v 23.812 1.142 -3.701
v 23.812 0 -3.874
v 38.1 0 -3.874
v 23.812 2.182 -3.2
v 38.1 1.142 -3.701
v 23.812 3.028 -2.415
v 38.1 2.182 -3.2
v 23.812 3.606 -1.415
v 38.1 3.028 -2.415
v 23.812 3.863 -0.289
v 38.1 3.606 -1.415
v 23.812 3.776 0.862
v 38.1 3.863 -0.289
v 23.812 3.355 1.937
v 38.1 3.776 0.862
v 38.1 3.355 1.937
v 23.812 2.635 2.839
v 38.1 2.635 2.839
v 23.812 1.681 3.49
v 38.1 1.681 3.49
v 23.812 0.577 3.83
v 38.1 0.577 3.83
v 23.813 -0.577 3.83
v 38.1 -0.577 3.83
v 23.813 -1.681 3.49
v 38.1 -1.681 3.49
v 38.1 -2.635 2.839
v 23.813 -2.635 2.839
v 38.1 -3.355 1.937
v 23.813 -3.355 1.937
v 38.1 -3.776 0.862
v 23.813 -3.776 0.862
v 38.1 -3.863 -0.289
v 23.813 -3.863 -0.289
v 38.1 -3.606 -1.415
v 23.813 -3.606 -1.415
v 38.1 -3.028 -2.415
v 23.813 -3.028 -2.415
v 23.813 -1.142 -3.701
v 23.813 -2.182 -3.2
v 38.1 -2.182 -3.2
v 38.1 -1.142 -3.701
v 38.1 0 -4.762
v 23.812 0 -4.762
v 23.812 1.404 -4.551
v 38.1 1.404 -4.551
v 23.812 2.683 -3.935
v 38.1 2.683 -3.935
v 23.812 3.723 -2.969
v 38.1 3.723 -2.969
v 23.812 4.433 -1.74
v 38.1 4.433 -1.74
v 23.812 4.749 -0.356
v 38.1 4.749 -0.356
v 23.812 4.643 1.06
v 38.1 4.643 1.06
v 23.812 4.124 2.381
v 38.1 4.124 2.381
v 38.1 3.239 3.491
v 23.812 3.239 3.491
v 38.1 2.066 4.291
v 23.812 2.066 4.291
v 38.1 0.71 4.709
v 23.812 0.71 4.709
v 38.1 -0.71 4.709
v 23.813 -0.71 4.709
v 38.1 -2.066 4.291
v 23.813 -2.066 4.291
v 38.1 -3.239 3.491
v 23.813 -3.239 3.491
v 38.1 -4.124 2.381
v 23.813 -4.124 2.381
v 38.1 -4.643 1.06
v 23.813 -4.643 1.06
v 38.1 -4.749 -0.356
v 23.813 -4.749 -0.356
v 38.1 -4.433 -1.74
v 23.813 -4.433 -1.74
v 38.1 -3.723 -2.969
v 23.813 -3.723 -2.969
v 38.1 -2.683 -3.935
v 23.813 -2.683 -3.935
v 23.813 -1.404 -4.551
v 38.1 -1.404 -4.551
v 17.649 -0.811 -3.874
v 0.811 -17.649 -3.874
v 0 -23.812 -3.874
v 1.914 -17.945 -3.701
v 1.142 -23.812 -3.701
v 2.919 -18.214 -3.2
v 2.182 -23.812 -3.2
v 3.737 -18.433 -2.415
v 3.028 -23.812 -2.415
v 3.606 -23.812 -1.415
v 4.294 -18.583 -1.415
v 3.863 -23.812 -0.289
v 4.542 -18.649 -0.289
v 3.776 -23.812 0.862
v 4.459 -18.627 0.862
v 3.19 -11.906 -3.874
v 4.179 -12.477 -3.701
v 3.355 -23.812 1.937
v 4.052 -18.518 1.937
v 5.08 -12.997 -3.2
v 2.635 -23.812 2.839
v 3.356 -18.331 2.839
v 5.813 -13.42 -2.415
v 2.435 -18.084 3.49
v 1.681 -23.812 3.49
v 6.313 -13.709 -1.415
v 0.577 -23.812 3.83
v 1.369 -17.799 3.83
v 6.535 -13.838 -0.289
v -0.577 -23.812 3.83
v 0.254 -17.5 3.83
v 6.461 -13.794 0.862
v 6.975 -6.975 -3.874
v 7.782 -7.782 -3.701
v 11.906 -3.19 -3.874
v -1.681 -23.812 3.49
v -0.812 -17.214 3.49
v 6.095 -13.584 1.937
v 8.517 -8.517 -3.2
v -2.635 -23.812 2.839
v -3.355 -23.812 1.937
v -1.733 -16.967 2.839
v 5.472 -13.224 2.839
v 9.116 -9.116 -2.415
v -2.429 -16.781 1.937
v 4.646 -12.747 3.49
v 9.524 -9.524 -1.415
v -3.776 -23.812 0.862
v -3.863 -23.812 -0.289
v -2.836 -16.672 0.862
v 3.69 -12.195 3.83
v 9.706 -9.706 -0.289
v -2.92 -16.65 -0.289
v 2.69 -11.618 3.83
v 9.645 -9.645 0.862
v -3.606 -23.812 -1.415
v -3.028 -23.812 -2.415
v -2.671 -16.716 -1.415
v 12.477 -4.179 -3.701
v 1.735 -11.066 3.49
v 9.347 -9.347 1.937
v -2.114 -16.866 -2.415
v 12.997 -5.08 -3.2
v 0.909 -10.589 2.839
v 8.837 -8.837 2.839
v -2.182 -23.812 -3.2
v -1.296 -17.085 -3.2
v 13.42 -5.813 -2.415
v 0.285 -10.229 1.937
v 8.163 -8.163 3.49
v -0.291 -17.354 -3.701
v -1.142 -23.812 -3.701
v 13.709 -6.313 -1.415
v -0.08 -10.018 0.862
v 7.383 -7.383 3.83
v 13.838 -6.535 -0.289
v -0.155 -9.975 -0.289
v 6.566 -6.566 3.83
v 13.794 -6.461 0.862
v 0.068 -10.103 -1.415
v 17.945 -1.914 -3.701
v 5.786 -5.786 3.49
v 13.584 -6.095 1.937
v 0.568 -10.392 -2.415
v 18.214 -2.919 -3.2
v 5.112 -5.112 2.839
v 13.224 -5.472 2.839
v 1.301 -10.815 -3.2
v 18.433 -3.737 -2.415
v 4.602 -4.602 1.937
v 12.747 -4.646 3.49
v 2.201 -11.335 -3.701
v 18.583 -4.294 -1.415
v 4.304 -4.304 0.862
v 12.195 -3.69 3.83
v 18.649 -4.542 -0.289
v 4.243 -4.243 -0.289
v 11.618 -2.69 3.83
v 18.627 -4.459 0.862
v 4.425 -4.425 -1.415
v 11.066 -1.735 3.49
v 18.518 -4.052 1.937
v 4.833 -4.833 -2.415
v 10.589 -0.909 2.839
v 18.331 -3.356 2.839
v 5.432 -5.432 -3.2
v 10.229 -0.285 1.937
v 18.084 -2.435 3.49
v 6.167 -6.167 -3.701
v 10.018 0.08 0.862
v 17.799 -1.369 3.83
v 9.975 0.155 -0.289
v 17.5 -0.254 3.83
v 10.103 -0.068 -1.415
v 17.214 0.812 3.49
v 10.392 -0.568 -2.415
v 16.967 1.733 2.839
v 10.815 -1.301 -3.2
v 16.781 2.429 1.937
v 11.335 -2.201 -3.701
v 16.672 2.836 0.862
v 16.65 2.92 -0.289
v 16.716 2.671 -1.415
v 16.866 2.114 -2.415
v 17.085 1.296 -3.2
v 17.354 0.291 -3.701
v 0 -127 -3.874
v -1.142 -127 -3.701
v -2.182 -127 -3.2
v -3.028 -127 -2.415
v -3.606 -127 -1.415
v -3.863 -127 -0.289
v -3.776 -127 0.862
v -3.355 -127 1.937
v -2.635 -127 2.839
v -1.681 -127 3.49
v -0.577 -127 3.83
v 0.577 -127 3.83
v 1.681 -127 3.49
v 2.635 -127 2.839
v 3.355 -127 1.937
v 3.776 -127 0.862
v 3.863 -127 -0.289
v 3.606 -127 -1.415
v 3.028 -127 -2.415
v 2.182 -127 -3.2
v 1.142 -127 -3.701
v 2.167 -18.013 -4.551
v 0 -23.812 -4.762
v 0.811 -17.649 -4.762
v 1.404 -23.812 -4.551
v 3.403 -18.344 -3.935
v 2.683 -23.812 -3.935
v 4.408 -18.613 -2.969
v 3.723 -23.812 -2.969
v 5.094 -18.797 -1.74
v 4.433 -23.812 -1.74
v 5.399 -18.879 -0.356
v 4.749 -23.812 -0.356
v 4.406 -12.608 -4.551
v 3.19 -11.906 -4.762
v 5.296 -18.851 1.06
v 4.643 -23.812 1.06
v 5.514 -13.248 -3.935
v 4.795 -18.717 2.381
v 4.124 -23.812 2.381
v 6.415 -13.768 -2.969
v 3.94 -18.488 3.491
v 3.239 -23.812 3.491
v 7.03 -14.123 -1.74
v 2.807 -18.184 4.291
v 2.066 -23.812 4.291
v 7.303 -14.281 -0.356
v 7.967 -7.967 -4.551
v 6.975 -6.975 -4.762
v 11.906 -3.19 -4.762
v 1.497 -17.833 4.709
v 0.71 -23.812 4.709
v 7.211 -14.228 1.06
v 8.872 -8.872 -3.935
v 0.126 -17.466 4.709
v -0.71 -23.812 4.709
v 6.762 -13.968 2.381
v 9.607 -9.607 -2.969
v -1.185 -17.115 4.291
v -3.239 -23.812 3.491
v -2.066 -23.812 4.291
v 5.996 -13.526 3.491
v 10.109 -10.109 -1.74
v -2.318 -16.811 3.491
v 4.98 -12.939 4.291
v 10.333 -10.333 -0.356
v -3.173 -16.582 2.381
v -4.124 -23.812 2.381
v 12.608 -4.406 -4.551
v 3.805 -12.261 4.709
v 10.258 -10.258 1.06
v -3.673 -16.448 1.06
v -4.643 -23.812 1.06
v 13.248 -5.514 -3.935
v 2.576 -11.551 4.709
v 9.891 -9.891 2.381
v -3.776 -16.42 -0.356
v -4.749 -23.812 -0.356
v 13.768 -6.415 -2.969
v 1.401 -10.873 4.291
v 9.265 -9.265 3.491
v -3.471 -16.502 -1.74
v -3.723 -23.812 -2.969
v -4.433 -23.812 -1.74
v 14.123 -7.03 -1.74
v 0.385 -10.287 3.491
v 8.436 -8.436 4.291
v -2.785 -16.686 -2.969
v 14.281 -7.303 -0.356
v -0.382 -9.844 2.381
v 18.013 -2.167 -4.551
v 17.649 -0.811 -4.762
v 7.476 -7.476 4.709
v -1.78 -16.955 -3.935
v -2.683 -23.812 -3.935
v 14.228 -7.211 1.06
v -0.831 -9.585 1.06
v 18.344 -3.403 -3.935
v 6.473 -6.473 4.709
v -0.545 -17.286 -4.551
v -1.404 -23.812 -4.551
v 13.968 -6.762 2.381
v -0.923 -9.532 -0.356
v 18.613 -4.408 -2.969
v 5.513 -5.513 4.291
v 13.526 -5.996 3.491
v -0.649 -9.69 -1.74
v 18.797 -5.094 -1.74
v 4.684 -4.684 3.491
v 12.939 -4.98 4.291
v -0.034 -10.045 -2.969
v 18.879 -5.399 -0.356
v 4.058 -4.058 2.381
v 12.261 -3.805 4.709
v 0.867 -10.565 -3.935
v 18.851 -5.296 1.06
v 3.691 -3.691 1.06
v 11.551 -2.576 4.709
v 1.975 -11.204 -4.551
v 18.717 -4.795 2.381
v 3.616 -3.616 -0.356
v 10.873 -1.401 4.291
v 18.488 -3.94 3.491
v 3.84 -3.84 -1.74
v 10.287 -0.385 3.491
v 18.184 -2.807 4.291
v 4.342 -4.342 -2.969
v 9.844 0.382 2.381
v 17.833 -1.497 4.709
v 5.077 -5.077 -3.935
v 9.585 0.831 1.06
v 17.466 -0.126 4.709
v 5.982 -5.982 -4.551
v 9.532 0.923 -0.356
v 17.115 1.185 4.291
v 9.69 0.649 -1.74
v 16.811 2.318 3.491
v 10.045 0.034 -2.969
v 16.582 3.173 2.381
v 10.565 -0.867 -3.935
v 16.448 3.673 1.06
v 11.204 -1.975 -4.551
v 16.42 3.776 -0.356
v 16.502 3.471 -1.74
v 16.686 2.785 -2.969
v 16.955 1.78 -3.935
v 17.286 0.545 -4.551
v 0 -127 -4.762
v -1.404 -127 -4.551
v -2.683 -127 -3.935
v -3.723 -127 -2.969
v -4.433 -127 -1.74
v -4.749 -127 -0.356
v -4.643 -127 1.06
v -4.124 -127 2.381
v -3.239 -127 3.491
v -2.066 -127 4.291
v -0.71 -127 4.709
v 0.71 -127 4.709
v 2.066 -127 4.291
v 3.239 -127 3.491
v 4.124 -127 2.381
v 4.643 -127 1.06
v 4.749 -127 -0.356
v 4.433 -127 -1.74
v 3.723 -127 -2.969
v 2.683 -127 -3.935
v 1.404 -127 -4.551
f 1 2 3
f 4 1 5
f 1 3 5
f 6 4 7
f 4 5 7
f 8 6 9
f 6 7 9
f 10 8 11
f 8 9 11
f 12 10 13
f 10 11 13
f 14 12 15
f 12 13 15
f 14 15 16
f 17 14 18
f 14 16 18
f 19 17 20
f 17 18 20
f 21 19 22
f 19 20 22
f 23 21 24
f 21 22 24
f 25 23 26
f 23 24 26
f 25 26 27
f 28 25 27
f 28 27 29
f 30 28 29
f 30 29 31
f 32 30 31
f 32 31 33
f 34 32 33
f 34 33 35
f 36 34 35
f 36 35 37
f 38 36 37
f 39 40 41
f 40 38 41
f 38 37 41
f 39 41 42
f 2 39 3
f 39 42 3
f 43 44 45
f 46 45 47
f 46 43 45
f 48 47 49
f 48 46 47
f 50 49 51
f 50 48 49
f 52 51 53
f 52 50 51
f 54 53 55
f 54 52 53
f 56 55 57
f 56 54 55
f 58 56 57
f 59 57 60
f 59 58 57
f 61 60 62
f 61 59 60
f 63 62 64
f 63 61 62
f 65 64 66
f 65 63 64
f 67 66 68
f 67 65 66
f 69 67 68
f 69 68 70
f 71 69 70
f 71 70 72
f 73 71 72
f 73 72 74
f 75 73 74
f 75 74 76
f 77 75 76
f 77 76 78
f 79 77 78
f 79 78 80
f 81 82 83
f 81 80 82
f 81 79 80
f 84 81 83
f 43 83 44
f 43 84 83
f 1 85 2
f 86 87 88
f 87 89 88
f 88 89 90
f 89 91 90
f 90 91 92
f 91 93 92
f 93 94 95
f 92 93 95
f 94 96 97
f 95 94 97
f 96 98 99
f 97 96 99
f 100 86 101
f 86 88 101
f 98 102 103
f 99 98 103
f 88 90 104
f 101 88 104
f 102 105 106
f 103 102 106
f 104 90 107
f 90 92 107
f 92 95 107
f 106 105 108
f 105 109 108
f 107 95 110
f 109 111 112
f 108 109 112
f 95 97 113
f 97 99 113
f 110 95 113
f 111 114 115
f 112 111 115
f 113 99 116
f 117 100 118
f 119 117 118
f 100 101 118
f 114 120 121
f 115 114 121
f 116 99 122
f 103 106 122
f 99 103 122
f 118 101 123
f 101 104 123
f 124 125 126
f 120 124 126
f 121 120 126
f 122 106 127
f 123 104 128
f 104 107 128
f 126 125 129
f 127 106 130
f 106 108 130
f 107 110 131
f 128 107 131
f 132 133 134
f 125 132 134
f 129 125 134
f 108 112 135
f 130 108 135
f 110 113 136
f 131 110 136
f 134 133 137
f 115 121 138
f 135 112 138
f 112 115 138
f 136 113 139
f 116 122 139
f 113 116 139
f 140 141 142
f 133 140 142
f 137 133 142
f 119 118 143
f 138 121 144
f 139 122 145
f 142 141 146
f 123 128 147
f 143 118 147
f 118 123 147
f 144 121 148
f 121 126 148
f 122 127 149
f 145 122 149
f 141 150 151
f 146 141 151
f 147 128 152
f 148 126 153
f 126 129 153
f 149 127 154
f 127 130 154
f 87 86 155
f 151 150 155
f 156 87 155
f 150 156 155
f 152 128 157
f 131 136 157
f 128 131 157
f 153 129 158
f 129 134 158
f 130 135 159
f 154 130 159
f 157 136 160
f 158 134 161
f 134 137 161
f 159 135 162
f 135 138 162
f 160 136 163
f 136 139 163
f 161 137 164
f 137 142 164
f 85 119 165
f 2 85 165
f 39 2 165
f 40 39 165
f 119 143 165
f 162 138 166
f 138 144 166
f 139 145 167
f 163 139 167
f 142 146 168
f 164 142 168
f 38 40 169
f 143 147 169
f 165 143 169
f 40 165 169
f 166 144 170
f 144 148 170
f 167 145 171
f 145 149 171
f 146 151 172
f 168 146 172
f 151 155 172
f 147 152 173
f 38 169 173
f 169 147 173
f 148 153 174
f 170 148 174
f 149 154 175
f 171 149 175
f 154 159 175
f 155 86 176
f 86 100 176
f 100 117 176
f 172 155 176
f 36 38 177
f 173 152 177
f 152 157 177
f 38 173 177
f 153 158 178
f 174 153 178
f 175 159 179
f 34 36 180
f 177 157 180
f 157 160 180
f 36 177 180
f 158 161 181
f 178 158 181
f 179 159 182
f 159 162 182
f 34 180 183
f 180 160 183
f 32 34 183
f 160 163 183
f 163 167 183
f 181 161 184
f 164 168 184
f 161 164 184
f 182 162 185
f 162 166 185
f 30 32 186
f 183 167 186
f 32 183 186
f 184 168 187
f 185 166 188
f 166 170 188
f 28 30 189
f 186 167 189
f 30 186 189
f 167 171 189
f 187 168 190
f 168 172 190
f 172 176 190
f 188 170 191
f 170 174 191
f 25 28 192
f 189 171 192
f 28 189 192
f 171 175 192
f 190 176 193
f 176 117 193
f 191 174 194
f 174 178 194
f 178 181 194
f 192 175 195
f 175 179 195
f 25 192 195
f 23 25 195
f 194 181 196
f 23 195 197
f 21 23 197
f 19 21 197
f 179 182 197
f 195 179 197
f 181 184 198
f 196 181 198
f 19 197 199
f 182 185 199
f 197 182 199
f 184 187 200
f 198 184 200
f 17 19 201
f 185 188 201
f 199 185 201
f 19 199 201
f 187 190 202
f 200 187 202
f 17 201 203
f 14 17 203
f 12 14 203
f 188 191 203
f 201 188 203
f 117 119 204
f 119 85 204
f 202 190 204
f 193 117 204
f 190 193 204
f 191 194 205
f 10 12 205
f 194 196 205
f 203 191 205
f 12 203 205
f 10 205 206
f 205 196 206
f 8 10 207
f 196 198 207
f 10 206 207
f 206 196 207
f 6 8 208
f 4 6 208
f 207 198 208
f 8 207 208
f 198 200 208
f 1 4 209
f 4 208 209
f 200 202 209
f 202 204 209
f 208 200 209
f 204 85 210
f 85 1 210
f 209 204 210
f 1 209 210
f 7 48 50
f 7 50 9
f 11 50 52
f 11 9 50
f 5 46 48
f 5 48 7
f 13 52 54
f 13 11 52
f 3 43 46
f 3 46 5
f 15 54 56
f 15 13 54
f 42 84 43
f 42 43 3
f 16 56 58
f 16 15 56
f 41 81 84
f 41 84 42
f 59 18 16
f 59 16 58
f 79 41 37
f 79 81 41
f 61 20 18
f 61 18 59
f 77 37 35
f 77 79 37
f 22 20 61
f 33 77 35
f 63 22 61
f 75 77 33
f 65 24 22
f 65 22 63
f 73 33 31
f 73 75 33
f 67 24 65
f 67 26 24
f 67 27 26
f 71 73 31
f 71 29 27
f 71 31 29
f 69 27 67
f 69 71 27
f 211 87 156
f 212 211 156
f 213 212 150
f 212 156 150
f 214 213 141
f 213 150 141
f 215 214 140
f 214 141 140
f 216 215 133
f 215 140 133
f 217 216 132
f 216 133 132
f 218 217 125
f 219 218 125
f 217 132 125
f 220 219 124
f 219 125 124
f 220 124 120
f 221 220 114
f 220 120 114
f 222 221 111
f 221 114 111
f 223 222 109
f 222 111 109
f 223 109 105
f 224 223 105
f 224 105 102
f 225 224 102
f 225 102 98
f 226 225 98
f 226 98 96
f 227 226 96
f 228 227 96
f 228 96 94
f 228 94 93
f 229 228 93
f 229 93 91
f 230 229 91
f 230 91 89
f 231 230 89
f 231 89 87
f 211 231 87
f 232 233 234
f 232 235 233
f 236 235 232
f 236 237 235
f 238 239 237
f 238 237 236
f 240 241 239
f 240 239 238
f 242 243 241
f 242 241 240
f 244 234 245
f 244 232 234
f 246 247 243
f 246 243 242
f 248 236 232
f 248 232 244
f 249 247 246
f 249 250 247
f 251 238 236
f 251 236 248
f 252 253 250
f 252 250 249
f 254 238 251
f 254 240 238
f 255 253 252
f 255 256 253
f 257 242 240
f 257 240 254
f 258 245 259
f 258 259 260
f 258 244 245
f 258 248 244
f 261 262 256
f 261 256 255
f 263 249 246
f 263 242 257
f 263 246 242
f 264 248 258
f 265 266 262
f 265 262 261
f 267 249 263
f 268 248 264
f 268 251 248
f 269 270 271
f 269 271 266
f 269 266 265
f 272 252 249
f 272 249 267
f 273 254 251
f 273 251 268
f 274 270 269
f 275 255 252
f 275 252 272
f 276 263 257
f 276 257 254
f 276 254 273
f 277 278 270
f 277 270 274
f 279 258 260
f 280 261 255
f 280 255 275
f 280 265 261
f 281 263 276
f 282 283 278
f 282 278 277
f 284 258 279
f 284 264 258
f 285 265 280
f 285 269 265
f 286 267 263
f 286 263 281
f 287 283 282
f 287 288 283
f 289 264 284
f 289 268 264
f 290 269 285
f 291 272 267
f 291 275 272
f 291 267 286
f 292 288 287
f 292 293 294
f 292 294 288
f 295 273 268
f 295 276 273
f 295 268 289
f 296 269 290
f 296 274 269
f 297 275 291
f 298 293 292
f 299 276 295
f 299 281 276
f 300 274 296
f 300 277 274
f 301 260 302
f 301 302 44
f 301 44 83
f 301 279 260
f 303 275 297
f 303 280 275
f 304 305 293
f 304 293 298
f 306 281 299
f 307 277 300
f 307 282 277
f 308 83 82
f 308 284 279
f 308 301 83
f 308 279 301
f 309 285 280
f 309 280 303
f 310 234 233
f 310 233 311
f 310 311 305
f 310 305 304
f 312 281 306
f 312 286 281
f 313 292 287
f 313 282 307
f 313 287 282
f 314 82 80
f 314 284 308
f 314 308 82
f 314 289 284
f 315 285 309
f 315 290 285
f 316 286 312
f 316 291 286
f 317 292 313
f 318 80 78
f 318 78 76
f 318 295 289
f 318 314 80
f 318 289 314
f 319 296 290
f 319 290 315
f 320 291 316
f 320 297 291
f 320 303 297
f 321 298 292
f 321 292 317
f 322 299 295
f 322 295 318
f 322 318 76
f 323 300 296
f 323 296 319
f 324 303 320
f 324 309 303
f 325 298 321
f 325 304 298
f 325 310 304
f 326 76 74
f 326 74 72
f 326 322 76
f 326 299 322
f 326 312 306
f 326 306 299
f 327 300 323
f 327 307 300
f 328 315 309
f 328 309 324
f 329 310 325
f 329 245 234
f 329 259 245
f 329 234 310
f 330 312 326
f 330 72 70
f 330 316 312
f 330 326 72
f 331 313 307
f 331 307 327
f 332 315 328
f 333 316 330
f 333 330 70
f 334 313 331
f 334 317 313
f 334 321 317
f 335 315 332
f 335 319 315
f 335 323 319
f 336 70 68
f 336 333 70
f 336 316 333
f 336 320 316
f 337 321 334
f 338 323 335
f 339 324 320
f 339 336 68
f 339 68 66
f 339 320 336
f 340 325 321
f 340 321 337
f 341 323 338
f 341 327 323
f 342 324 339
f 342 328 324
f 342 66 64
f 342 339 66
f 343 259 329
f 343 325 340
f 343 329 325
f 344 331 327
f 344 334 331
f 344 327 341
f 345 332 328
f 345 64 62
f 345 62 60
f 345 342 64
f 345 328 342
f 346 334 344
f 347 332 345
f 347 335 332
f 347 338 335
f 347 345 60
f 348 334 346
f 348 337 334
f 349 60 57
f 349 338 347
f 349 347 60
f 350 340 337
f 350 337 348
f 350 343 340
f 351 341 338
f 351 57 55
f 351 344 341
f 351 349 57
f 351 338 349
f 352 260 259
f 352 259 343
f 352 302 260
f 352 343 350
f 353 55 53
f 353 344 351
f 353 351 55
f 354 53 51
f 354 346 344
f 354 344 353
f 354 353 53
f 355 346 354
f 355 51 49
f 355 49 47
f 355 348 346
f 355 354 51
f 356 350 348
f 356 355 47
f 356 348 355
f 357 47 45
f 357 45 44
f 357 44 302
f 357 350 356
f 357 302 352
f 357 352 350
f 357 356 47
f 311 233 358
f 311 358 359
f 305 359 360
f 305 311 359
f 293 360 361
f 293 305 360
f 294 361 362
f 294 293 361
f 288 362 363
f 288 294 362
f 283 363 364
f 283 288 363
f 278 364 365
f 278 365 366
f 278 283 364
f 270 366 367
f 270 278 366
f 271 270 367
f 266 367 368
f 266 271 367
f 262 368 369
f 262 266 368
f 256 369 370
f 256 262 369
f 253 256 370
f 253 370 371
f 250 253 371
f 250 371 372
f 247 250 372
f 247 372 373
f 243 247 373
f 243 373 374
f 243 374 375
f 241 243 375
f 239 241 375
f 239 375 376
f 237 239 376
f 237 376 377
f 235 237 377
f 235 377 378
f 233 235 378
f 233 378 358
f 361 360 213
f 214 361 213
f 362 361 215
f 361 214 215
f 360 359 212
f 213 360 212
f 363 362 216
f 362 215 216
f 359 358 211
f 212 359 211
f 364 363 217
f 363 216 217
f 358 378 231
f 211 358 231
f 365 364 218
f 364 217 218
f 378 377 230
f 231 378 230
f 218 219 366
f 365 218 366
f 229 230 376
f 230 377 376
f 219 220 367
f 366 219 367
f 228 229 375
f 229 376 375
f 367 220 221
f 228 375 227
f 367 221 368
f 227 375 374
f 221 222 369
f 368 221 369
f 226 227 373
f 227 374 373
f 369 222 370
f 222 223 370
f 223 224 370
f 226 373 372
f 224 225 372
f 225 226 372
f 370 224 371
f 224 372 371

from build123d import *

# Parameters (mm, degrees)
SKETCH2_R   = 4.7625
SKETCH2_R_2 = 3.8735


with BuildPart() as part:
    # Sweep1: sweep along a path in Sketch1
    with BuildLine(Plane.XY) as sweep1_path:
        Line((0, -127), (0, -23.8125))
        ThreePointArc((0, -23.8125), (6.974519773, -6.974519773), (23.8125, 0))
        Line((23.8125, 0), (38.1, 0))
    # Sketch2 → Sweep1 (sweep)
    with BuildSketch(Plane(origin=(38.1, 0, 0), x_dir=(0, 0, -1), z_dir=(1, 0, 0))):
        Circle(SKETCH2_R)
        Circle(SKETCH2_R_2, mode=Mode.SUBTRACT)
    sweep(path=sweep1_path.line)


solid = part.part
